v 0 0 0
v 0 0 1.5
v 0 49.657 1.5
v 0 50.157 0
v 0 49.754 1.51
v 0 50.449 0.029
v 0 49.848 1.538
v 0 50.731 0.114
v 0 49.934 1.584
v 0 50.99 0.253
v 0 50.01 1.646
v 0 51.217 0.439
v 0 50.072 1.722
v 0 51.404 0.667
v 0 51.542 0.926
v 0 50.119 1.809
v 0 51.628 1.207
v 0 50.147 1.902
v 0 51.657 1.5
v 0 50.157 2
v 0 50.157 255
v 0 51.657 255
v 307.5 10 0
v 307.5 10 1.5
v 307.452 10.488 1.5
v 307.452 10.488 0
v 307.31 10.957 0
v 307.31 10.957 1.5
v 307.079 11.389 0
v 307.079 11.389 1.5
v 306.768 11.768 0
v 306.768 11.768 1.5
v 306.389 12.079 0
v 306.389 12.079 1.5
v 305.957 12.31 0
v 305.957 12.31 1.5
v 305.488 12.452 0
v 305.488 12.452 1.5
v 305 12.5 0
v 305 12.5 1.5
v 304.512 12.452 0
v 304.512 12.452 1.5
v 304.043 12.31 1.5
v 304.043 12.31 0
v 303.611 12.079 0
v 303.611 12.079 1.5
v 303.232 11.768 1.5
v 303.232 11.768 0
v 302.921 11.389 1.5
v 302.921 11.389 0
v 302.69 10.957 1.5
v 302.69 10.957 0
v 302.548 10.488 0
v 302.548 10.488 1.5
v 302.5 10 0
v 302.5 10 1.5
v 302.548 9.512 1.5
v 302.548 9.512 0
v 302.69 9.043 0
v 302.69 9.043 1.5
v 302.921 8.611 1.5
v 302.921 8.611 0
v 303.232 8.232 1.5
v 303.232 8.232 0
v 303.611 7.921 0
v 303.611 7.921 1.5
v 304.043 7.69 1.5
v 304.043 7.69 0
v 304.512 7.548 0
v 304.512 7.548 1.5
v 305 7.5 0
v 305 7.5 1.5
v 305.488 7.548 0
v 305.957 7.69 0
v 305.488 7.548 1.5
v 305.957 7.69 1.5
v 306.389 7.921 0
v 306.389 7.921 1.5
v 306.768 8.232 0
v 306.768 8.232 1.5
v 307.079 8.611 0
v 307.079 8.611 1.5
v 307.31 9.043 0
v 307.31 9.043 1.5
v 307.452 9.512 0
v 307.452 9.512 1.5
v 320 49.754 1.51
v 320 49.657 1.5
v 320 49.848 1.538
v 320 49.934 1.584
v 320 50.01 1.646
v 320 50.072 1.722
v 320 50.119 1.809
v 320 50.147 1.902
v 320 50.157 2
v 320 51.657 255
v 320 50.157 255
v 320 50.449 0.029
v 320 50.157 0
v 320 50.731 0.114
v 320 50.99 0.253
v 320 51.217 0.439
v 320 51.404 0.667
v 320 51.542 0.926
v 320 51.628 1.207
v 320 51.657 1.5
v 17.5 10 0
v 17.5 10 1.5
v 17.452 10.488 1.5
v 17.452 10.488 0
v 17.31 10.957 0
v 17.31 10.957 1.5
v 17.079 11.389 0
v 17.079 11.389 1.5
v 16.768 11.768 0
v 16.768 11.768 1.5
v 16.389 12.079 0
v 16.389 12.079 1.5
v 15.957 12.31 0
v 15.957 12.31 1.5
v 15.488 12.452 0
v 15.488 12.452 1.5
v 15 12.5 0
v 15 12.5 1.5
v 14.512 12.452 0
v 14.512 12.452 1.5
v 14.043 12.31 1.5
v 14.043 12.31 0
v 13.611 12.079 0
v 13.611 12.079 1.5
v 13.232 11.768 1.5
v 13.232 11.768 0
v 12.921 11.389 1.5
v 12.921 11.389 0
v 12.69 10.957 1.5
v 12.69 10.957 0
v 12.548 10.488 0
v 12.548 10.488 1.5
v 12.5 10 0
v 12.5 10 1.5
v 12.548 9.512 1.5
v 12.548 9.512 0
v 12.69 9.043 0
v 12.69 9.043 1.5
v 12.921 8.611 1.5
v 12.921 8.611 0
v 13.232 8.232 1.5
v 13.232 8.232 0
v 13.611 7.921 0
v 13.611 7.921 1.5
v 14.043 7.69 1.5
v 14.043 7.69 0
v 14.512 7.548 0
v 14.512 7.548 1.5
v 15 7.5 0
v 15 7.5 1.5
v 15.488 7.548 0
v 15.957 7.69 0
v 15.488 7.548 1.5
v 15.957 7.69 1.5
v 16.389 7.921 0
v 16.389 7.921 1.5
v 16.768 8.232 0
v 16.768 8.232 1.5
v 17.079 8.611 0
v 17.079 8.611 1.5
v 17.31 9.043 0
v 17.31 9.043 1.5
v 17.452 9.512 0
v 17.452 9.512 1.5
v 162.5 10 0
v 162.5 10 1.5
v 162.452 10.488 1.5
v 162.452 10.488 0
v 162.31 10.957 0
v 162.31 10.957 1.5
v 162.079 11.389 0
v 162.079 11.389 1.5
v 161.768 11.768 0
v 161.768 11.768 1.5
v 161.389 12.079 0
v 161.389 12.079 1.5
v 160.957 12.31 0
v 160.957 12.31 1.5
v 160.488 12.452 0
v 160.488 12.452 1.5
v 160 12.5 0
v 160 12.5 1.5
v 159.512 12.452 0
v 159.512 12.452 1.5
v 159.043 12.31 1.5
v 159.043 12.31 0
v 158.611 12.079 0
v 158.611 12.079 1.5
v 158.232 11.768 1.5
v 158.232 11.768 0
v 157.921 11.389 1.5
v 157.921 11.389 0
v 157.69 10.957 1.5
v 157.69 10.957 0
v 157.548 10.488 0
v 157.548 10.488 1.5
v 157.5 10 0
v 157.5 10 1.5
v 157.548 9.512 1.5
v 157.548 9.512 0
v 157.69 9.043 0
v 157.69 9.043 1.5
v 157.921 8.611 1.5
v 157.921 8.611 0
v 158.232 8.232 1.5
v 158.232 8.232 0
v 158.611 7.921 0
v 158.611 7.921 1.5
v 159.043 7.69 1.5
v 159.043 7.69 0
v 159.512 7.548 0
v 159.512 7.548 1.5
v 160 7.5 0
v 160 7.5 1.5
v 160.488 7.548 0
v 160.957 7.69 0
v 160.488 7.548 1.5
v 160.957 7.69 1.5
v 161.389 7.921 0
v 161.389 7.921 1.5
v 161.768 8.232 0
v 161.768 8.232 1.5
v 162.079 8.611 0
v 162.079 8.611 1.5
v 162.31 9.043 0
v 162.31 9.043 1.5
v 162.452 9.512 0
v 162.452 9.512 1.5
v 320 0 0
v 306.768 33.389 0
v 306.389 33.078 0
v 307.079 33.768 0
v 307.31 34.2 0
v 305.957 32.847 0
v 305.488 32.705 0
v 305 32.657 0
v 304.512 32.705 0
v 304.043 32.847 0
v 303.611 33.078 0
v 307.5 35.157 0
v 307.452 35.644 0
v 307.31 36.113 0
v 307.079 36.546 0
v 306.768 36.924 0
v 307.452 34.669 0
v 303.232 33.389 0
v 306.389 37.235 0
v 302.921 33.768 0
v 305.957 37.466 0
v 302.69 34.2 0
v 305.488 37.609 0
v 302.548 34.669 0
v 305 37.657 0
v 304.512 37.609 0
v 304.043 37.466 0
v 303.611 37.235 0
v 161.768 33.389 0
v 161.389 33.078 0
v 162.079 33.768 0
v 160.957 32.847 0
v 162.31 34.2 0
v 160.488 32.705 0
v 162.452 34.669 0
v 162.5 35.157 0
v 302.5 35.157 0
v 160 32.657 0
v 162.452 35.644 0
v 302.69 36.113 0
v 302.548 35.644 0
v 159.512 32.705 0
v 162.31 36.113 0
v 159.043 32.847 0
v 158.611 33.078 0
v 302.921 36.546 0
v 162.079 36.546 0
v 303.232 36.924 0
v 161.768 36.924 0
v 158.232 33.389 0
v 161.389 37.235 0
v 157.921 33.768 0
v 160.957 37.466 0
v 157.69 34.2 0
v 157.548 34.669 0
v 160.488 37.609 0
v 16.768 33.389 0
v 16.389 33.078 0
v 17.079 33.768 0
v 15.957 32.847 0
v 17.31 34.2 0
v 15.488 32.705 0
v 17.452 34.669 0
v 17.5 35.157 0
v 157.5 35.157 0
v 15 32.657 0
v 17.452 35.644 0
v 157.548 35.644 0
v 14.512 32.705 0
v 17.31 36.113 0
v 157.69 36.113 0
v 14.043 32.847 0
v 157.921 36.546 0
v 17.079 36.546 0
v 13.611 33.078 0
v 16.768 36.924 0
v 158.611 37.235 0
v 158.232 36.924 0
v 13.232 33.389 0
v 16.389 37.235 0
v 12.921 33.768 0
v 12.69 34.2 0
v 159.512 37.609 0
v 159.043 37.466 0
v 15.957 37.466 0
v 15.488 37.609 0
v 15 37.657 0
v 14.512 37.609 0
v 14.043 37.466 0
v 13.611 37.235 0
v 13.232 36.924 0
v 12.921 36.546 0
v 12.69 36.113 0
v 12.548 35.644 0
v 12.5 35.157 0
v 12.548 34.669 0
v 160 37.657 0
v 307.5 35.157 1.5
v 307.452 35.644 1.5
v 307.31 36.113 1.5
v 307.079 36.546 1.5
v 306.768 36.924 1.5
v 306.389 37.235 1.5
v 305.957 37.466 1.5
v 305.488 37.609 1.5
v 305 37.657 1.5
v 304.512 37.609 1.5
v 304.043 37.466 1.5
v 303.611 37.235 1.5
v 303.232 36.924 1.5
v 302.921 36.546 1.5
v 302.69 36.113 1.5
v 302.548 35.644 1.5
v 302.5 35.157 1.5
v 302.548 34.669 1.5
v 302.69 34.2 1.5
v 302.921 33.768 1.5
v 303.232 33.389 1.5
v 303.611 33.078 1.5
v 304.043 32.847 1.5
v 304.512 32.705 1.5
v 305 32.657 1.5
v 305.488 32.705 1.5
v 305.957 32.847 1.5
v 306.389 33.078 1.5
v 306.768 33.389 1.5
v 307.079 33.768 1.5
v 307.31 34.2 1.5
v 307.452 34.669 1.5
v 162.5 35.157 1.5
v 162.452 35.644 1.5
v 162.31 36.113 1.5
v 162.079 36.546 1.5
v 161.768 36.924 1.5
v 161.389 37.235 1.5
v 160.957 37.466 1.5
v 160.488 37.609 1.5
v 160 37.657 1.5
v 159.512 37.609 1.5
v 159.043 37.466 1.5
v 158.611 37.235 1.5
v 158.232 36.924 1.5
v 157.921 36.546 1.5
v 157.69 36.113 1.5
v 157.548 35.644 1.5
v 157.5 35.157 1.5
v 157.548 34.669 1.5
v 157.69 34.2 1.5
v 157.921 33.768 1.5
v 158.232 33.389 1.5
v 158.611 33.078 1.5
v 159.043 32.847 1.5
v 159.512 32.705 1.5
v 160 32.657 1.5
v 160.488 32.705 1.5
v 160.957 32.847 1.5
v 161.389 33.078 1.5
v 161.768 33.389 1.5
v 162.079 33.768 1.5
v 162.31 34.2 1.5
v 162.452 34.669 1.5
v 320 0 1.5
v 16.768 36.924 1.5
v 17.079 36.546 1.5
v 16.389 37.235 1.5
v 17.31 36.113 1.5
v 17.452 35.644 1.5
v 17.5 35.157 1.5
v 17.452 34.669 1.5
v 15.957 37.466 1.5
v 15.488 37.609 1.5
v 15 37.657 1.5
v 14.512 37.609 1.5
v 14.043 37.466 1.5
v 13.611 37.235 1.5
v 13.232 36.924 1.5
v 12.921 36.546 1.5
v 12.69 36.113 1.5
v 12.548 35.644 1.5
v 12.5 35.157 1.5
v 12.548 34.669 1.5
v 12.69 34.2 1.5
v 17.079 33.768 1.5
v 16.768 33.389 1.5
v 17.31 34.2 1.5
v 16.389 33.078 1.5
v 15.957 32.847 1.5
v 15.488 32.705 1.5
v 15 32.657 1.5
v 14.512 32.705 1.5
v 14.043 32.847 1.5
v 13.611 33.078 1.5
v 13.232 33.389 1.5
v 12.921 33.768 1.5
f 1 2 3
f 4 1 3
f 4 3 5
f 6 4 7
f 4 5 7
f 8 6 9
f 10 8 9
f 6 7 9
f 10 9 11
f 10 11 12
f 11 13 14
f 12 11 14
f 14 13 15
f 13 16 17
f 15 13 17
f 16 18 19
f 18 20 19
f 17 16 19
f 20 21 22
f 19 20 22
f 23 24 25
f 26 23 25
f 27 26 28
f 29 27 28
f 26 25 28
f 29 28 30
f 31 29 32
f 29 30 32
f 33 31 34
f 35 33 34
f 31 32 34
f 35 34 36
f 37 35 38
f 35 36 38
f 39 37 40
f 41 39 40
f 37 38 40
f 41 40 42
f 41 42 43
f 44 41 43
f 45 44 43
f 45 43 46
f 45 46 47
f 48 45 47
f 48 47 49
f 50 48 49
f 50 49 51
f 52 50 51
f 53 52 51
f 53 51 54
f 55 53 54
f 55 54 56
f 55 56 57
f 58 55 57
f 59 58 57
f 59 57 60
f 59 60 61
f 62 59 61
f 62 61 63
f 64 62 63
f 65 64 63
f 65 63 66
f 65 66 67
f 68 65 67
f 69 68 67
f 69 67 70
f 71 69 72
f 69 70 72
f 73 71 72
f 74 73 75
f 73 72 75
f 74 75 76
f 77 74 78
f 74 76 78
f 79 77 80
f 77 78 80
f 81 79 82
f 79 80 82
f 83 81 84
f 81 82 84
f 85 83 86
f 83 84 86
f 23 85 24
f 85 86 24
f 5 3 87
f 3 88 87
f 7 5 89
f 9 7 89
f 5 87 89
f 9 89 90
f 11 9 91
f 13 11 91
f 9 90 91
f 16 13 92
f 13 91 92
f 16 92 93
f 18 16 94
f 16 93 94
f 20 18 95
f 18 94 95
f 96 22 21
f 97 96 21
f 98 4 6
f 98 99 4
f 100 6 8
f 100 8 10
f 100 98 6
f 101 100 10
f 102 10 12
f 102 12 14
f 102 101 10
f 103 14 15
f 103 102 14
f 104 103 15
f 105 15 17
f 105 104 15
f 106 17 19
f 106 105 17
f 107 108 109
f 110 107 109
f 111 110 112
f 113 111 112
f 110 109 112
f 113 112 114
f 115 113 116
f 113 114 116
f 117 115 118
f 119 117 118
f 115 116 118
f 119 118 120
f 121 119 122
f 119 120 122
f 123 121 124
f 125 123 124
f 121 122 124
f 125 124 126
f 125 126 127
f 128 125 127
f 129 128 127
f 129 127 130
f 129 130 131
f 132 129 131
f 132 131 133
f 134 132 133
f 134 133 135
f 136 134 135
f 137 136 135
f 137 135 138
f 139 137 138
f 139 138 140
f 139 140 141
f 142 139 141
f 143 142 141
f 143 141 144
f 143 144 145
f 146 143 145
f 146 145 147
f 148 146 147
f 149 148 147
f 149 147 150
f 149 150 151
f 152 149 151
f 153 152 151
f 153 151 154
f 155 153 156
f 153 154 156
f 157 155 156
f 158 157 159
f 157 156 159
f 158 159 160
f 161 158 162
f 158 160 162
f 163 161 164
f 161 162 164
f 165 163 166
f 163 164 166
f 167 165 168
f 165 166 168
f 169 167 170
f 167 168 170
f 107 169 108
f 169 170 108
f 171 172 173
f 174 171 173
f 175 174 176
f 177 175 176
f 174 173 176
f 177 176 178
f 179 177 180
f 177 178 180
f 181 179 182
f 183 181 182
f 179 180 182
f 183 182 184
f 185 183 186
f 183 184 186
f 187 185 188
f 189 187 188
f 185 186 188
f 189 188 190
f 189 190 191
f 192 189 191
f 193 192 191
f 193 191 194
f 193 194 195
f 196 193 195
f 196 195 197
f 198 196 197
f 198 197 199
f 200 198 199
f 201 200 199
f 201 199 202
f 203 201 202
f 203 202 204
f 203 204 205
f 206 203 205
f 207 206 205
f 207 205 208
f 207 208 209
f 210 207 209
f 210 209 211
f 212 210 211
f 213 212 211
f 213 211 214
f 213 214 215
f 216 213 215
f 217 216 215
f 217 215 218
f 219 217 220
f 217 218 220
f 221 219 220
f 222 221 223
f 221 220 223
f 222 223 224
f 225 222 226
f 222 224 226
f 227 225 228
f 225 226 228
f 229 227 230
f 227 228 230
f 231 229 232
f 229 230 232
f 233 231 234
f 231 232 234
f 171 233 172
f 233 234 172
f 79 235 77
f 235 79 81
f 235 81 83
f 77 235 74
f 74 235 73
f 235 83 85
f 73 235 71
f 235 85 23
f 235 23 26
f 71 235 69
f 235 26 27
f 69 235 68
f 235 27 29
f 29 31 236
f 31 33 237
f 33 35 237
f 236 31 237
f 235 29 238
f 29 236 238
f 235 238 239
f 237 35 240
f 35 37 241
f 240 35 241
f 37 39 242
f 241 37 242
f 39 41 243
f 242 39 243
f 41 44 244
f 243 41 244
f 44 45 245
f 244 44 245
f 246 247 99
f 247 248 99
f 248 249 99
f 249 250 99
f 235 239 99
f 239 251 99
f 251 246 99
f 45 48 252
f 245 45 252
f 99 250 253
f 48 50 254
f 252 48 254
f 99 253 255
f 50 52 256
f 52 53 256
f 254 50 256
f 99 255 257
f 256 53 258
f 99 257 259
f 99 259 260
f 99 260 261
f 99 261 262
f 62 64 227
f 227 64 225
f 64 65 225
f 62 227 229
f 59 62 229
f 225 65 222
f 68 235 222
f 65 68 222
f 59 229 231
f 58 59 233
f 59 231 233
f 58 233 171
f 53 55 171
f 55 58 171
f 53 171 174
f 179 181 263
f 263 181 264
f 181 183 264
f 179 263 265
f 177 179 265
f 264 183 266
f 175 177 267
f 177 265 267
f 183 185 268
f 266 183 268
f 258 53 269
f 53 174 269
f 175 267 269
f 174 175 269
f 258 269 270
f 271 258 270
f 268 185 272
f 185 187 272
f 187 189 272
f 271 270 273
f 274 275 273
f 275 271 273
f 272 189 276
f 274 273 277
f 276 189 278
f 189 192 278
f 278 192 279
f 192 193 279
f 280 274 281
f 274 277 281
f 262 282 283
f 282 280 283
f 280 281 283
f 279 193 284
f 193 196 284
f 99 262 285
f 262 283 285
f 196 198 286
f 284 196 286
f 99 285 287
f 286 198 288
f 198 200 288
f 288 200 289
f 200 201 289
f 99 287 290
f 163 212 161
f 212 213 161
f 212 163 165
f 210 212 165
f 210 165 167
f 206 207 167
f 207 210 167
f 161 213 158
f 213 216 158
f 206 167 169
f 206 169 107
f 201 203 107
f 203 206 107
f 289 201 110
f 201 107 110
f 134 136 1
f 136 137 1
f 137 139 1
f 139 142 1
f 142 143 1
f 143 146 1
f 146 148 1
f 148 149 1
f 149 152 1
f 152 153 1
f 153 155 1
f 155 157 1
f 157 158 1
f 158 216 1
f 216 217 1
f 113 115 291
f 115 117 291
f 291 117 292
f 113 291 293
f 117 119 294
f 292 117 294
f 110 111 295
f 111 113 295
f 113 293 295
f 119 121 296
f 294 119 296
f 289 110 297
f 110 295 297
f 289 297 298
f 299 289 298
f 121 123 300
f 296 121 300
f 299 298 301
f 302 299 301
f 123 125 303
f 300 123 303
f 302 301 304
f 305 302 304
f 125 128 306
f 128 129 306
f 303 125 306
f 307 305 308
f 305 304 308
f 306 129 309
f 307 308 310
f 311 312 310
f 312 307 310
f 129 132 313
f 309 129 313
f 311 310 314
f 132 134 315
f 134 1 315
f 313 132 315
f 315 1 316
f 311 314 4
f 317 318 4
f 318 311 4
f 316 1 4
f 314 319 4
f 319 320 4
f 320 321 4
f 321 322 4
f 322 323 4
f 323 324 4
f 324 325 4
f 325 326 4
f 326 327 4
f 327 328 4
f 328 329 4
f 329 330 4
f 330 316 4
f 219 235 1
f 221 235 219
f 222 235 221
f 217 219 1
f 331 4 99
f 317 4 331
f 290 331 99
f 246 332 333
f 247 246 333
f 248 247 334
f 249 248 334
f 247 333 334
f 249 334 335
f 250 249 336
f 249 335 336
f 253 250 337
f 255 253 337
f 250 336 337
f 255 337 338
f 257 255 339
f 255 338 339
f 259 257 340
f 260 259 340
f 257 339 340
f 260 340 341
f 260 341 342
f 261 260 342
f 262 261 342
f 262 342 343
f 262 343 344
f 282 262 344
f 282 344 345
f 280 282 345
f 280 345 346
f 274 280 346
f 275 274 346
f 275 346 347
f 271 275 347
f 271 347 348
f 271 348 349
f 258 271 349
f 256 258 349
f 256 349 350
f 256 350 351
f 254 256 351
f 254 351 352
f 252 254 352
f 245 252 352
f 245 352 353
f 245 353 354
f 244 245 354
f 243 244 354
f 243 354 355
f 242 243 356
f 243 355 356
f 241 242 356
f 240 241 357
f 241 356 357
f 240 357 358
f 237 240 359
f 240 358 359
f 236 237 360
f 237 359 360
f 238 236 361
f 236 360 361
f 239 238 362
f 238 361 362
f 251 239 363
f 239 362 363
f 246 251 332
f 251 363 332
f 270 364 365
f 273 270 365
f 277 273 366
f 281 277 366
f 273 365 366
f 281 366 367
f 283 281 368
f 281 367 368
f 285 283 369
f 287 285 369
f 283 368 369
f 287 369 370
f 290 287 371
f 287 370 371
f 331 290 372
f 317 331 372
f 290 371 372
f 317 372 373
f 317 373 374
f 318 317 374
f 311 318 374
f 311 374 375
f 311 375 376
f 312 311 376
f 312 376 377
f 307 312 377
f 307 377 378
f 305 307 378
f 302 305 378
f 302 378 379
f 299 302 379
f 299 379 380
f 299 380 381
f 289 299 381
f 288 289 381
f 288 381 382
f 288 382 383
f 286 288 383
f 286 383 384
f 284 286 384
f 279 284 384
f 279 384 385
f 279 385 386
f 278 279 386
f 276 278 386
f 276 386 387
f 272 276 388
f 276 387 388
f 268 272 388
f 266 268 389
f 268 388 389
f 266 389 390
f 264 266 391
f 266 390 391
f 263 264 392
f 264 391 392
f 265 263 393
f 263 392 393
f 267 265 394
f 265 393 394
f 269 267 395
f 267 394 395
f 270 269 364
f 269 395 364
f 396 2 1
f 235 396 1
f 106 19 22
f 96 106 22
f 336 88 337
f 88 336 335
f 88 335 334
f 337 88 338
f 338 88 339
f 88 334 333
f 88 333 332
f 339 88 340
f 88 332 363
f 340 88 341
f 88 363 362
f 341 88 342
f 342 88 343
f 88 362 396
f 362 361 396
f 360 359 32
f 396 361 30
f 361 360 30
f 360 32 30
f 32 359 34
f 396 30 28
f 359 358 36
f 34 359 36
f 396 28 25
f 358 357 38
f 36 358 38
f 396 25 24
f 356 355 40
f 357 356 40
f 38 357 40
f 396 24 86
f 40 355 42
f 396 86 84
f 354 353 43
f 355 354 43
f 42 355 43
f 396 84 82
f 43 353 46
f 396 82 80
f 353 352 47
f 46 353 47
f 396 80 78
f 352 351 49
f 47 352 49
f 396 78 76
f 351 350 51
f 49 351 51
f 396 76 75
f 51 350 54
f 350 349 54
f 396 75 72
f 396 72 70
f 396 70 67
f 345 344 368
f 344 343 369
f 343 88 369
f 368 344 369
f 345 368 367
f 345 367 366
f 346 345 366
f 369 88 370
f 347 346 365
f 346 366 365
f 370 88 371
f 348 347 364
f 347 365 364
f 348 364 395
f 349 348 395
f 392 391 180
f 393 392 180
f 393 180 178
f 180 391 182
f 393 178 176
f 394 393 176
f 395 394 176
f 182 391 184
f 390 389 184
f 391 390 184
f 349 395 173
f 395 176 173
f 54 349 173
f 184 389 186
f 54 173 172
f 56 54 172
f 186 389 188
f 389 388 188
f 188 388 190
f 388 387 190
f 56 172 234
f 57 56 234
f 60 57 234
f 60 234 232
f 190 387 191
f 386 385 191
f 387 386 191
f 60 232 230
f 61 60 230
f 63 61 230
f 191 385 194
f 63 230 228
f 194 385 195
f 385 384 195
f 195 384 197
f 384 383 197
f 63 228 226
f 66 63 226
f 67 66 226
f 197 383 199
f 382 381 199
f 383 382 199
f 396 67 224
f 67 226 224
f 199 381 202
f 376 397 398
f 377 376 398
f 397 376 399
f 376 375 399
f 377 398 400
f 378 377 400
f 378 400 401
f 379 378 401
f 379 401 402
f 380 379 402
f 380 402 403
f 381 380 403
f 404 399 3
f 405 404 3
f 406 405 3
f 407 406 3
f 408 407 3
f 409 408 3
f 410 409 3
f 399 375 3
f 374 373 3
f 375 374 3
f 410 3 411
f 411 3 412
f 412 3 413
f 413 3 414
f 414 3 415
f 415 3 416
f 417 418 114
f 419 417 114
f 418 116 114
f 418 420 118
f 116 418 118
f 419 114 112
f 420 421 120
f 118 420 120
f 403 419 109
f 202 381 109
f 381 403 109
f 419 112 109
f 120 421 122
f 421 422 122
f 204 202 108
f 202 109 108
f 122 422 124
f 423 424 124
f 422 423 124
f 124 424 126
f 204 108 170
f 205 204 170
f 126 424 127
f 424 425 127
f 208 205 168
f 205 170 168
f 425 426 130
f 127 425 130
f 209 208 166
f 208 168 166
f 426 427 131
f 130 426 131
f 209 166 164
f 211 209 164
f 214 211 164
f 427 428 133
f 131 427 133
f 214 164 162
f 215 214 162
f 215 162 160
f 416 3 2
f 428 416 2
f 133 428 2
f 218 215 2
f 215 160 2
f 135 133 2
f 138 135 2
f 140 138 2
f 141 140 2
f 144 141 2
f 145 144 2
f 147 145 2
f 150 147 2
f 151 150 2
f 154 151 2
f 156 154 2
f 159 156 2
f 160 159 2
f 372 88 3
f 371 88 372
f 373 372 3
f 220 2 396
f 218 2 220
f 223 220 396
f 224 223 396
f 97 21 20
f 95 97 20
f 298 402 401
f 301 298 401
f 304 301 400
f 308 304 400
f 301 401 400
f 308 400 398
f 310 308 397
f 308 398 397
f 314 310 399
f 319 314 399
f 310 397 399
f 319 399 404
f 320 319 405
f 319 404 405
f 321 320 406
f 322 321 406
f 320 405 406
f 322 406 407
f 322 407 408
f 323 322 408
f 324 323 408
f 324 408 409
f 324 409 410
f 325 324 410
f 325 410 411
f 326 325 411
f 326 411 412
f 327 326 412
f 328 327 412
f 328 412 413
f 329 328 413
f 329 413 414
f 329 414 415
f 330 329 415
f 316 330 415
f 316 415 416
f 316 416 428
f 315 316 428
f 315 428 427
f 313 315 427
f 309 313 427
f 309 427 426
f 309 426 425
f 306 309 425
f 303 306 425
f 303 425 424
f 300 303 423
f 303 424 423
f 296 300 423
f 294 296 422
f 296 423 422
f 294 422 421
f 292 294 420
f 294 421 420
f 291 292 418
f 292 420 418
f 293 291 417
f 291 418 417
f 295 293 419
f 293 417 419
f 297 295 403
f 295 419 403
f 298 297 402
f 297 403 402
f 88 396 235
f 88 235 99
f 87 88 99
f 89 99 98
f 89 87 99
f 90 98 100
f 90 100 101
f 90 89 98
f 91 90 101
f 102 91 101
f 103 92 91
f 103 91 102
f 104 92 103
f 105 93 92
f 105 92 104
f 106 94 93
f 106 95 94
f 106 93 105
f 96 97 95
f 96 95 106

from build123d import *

# Parameters (mm, degrees)
F1_DEPTH = 320
F2_R     = 1.5
F3_R     = 0.5
F4_R     = 2.5
F5_DEPTH = 1.501


with BuildPart() as f1:
    # F0 (on Right) → F1 (new body)
    with BuildSketch(Plane.YZ):
        Polygon((0, 1.5), (0, 0), (51.65659, 0), (51.65659, 255), (50.15659, 255), (50.15659, 1.5), align=None)
    extrude(amount=F1_DEPTH)

    # F2
    f2_edges = [f1.edges().sort_by_distance(p)[0] for p in [
        (160, 51.65659, 0),
    ]]
    fillet(f2_edges, radius=F2_R)

    # F3
    f3_edges = [f1.edges().sort_by_distance(p)[0] for p in [
        (160, 50.15659, 1.5),
    ]]
    fillet(f3_edges, radius=F3_R)

    # F4 (on face) → F5 (cut, through all)
    with BuildSketch(Plane.XY.offset(1.5)):
        with Locations((15, 35.15659)):
            Circle(F4_R)
        with Locations((15, 10)):
            Circle(F4_R)
        with Locations((160, 10)):
            Circle(F4_R)
        with Locations((160, 35.15659)):
            Circle(F4_R)
        with Locations((305, 35.15659)):
            Circle(F4_R)
        with Locations((305, 10)):
            Circle(F4_R)
    extrude(amount=-F5_DEPTH, mode=Mode.SUBTRACT)


solid = f1.part
